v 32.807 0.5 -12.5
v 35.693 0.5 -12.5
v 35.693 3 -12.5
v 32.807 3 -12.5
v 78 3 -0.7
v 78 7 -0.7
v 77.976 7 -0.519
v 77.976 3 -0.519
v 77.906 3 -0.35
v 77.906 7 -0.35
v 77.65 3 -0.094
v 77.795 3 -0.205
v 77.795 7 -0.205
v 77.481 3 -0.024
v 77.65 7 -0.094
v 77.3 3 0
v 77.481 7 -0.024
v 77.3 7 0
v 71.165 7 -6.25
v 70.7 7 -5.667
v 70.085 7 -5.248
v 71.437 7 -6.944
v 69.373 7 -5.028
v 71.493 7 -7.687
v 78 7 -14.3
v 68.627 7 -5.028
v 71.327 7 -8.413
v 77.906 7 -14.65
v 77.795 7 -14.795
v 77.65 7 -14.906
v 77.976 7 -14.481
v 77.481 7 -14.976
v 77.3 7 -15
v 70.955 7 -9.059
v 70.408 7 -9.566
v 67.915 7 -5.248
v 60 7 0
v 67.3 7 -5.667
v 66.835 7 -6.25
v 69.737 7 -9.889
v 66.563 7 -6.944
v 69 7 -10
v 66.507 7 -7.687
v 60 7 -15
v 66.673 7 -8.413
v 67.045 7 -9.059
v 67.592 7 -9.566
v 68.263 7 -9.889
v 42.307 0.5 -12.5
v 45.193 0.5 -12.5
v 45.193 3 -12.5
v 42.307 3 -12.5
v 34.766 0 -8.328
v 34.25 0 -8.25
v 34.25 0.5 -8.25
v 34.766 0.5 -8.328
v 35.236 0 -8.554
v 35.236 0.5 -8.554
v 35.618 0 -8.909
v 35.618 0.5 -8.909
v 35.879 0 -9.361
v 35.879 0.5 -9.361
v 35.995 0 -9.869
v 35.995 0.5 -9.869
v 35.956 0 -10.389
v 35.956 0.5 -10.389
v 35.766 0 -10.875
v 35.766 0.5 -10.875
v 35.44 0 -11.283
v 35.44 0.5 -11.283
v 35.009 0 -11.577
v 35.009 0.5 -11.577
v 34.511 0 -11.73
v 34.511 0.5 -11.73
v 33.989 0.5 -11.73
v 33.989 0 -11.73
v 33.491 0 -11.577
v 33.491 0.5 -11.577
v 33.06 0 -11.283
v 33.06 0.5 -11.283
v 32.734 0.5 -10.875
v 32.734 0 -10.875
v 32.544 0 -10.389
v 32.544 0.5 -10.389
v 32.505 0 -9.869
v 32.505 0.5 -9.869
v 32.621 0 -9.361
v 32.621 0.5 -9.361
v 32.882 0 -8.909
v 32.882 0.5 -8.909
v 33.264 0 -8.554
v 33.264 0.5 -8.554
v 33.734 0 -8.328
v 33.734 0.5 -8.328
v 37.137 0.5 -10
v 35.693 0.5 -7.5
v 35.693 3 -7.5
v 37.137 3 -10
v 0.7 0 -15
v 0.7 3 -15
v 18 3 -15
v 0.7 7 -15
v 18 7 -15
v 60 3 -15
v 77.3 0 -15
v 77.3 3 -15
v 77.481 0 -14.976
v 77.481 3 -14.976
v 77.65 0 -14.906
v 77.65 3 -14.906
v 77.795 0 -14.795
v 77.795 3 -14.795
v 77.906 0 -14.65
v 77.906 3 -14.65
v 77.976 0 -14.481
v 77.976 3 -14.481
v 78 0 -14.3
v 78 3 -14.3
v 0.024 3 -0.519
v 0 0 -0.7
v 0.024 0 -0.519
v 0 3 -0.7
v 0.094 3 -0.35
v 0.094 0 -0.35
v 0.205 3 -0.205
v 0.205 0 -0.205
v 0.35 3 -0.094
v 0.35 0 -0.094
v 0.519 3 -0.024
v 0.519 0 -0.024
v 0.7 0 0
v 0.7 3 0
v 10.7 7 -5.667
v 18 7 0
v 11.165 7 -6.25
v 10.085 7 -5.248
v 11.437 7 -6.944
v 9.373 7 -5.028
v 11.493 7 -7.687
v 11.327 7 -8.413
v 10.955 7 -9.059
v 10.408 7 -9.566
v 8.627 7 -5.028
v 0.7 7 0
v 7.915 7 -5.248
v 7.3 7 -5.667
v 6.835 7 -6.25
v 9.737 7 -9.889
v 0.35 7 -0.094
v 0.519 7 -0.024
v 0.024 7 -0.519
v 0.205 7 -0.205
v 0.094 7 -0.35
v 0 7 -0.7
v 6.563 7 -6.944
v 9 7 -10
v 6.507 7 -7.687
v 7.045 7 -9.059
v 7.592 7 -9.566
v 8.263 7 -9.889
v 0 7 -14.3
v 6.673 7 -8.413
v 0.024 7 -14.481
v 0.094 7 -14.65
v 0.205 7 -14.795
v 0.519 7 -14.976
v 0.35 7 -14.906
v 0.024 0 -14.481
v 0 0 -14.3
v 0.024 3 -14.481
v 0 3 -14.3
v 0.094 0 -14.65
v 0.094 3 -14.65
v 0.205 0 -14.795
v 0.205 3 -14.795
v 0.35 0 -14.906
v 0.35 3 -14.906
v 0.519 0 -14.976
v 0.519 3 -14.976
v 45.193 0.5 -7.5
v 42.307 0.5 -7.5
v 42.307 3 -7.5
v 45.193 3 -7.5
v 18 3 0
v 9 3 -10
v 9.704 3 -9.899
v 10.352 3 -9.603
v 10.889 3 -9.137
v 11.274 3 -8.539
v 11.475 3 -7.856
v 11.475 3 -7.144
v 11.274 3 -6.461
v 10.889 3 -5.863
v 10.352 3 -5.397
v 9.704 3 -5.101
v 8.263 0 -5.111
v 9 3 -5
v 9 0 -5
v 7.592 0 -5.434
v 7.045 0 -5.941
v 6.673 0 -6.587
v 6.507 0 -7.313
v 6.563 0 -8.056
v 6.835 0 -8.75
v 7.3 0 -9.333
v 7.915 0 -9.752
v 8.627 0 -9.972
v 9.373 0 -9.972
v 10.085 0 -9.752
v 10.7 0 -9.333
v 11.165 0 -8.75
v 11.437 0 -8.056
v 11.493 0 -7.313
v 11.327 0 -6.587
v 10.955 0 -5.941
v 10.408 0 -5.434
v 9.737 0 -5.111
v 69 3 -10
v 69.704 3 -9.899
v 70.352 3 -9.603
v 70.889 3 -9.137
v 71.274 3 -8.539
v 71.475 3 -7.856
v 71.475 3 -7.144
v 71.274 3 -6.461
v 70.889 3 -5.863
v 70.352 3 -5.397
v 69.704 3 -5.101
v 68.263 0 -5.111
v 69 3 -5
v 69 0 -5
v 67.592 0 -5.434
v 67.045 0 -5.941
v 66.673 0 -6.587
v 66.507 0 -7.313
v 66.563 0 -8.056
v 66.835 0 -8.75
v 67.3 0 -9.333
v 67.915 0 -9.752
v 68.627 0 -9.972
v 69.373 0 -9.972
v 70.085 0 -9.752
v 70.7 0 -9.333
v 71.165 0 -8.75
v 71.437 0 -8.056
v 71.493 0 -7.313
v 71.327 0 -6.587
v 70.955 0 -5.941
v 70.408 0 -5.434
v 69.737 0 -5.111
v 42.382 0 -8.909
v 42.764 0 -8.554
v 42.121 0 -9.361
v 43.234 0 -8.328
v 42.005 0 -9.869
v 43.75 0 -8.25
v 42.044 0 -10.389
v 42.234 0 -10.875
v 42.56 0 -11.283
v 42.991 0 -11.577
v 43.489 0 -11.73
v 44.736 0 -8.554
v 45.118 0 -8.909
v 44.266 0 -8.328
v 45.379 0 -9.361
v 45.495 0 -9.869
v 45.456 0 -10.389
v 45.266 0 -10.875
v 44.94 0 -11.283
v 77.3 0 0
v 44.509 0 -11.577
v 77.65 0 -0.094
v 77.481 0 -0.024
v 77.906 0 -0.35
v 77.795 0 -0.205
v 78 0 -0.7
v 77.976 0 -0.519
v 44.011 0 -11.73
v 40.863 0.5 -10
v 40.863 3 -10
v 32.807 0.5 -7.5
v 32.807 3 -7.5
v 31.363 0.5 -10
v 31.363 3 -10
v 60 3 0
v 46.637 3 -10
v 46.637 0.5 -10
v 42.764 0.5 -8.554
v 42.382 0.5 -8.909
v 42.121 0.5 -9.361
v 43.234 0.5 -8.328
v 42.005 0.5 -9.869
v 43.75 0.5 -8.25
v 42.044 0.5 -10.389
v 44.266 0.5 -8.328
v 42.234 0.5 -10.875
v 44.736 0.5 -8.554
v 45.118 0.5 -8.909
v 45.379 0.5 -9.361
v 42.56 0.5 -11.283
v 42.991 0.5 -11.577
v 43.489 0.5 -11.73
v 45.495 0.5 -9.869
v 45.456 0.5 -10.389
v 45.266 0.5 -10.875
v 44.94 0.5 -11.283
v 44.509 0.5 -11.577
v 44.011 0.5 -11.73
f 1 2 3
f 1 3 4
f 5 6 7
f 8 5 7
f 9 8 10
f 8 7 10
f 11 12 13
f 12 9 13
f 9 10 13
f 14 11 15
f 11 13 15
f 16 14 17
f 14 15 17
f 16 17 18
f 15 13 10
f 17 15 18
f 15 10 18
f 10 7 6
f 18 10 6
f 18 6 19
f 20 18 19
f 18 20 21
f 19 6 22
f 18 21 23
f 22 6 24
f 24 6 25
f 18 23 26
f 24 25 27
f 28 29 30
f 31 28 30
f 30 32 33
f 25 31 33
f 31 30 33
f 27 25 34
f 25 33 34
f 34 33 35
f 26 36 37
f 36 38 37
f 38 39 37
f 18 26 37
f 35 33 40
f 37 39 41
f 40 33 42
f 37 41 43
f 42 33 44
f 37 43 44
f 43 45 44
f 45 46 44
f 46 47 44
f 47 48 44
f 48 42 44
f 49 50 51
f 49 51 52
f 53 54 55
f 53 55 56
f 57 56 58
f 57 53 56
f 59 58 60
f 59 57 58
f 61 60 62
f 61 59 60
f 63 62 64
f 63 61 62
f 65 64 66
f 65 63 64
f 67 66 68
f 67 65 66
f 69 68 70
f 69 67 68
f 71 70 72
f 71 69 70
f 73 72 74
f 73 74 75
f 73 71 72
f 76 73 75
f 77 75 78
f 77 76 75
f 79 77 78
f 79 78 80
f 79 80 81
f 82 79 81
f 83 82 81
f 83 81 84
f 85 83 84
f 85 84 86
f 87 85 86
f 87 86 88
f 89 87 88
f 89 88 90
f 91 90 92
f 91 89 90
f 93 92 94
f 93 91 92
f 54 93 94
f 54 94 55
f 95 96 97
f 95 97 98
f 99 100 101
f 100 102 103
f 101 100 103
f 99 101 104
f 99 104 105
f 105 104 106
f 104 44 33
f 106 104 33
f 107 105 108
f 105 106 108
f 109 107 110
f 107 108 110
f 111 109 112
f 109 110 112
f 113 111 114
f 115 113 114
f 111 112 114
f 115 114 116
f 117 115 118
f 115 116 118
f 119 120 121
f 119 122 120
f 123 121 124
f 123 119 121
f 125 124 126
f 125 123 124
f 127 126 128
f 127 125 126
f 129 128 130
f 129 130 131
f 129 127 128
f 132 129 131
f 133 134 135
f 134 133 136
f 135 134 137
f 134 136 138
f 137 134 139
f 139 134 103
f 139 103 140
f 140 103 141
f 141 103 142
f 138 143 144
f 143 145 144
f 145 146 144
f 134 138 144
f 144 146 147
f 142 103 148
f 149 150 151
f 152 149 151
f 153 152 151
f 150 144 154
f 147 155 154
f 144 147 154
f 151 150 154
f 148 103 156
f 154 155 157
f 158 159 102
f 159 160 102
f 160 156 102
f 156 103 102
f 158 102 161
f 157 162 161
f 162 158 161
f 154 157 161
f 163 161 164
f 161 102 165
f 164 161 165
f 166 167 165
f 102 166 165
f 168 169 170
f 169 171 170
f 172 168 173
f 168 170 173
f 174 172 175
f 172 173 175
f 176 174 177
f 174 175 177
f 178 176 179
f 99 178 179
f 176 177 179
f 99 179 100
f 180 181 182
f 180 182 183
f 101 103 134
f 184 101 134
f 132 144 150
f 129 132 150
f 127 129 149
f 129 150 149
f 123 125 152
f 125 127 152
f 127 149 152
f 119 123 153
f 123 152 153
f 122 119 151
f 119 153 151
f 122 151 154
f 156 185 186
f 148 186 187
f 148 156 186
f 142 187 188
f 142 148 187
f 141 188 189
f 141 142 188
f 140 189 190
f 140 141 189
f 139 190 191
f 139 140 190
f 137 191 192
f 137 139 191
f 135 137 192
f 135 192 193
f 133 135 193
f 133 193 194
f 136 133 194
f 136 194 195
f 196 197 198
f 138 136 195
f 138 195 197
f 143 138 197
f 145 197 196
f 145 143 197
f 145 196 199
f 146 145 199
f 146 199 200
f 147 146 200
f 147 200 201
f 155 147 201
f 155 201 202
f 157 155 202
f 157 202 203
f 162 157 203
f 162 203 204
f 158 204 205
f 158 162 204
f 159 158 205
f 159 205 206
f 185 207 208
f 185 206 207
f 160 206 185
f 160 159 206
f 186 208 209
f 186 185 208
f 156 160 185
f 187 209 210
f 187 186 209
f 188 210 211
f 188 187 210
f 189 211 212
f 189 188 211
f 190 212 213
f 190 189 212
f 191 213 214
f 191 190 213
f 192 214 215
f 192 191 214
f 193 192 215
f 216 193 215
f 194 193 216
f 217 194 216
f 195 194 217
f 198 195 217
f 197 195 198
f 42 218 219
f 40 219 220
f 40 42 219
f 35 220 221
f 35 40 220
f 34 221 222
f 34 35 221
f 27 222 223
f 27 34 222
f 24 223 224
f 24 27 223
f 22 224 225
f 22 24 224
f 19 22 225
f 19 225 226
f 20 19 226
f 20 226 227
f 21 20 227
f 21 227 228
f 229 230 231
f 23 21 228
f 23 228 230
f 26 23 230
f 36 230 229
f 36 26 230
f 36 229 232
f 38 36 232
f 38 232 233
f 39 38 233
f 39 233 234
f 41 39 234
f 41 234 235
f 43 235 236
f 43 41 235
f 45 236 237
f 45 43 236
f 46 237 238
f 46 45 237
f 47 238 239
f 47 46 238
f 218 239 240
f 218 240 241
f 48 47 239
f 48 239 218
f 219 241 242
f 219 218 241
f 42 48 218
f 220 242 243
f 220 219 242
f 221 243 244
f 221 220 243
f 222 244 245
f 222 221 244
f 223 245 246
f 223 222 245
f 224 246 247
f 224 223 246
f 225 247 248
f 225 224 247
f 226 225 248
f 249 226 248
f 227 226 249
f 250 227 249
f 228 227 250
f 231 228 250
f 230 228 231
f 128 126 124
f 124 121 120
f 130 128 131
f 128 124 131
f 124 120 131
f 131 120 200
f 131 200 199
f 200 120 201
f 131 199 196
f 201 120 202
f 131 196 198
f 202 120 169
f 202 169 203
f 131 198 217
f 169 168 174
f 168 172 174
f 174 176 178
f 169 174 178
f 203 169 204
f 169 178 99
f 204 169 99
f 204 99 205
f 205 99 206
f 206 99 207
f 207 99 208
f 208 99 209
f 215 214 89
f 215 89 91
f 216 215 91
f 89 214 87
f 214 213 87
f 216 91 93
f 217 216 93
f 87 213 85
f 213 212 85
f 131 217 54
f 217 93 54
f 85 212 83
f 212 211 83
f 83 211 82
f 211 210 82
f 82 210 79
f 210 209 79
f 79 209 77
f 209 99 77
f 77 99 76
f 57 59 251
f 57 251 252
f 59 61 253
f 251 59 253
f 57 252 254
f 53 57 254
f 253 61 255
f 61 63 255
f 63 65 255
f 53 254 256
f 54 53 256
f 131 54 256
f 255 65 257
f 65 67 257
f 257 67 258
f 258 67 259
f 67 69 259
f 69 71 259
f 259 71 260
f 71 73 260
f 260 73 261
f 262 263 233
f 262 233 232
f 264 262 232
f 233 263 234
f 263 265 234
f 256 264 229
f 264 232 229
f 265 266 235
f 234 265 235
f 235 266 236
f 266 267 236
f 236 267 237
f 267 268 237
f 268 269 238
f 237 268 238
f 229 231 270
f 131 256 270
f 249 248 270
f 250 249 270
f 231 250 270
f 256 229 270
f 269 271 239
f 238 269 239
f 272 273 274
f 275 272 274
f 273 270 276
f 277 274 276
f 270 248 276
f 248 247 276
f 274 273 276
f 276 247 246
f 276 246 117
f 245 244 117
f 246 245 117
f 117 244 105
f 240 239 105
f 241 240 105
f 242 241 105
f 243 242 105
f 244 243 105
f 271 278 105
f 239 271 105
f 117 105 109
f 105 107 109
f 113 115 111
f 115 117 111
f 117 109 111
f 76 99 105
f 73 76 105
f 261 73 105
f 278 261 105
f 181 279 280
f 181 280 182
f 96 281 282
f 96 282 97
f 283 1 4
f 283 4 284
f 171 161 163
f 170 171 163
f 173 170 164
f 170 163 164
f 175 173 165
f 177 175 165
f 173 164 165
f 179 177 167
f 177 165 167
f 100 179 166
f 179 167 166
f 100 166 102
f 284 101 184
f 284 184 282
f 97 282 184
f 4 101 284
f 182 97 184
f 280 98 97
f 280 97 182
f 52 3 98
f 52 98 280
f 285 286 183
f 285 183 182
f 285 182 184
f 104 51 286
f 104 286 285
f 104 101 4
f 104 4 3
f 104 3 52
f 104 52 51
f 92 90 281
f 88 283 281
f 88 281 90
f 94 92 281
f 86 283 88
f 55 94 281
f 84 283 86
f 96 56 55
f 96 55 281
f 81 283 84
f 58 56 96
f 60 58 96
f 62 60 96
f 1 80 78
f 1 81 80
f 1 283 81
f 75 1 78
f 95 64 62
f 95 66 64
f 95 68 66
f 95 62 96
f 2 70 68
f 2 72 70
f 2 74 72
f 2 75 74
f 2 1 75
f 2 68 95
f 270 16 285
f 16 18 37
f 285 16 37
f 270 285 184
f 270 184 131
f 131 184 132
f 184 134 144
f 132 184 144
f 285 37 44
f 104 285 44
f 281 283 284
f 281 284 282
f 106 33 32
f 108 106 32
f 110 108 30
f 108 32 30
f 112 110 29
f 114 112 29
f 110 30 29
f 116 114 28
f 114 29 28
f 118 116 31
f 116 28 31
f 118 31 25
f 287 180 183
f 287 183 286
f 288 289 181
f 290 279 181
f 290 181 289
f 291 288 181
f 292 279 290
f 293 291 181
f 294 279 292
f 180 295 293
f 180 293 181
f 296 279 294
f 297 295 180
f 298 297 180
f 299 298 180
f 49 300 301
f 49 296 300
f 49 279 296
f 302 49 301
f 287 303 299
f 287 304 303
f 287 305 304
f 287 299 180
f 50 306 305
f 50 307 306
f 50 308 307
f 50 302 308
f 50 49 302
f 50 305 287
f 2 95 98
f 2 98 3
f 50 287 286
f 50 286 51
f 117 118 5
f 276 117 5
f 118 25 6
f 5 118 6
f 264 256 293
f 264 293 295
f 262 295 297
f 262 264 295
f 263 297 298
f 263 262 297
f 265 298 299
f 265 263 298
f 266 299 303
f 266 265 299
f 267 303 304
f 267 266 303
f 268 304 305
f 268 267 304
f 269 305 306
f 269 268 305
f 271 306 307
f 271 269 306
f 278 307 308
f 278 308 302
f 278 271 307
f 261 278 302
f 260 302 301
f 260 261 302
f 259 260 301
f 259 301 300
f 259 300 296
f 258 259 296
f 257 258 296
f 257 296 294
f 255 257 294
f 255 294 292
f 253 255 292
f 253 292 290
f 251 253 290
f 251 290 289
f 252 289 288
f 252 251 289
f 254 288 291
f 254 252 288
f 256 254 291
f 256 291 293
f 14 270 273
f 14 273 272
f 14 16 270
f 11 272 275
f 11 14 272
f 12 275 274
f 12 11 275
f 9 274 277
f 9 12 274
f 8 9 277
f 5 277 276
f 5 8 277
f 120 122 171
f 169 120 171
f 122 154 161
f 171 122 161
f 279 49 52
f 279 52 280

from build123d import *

# Parameters (mm, degrees)
SKETCH1_W           = 78
SKETCH1_H           = 15
SKETCH1_R           = 2.5
BOSS_EXTRUDE1_DEPTH = 3
SKETCH1_3_R         = 1.75
BOSS_EXTRUDE2_DEPTH = 0.5
FILLET1_R           = 0.7
BOSS_EXTRUDE3_START = -7
SKETCH2_R           = 2.5
BOSS_EXTRUDE3_DEPTH = 7


with BuildPart() as part:
    # Sketch1 → Boss-Extrude1 (new body)
    with BuildSketch(Plane(origin=(0, 0, 0), x_dir=(1, 0, 0), z_dir=(0, 1, 0))):
        with Locations((39, 7.5)):
            Rectangle(SKETCH1_W, SKETCH1_H)
        with Locations((9, 7.5)):
            Circle(SKETCH1_R, mode=Mode.SUBTRACT)
        Polygon((31.363249, 10), (32.806624, 12.5), (35.693376, 12.5), (37.136751, 10), (35.693376, 7.5), (32.806624, 7.5), align=None, mode=Mode.SUBTRACT)
        Polygon((42.306624, 12.5), (45.193376, 12.5), (46.636751, 10), (45.193376, 7.5), (42.306624, 7.5), (40.863249, 10), align=None, mode=Mode.SUBTRACT)
        with Locations((69, 7.5)):
            Circle(SKETCH1_R, mode=Mode.SUBTRACT)
    extrude(amount=BOSS_EXTRUDE1_DEPTH)

    # Sketch1<3> → Boss-Extrude2 (add)
    # profile 1 of 2: a face of its own
    with BuildSketch(Plane(origin=(0, 0, 0), x_dir=(1, 0, 0), z_dir=(0, 1, 0))):
        Polygon((35.693376, 12.5), (32.806624, 12.5), (31.363249, 10), (32.806624, 7.5), (35.693376, 7.5), (37.136751, 10), align=None)
        with Locations((34.25, 10)):
            Circle(SKETCH1_3_R, mode=Mode.SUBTRACT)
    # profile 2 of 2: a face of its own
    with BuildSketch(Plane(origin=(0, 0, 0), x_dir=(1, 0, 0), z_dir=(0, 1, 0))):
        Polygon((46.636751, 10), (45.193376, 12.5), (42.306624, 12.5), (40.863249, 10), (42.306624, 7.5), (45.193376, 7.5), align=None)
        with Locations((43.75, 10)):
            Circle(SKETCH1_3_R, mode=Mode.SUBTRACT)
    extrude(amount=BOSS_EXTRUDE2_DEPTH)

    # Fillet1
    fillet1_edges = [part.edges().sort_by_distance(p)[0] for p in [
        (78, 1.5, -15),
        (78, 1.5, 0),
        (0, 1.5, 0),
        (0, 1.5, -15),
    ]]
    fillet(fillet1_edges, radius=FILLET1_R)

    # Sketch2 → Boss-Extrude3 (add)
    # profile 1 of 2: a face of its own
    with BuildSketch(Plane(origin=(0, 0, 0), x_dir=(-1, 0, 0), z_dir=(0, -1, 0)).offset(BOSS_EXTRUDE3_START)):
        with BuildLine():
            Line((-77.3, 0), (-60, 0))
            Line((-60, 0), (-60, 15))
            Line((-60, 15), (-77.3, 15))
            ThreePointArc((-77.3, 15), (-77.794975, 14.794975), (-78, 14.3))
            Line((-78, 14.3), (-78, 0.7))
            ThreePointArc((-78, 0.7), (-77.794975, 0.205025), (-77.3, 0))
        make_face()
        with Locations((-69, 7.5)):
            Circle(SKETCH2_R, mode=Mode.SUBTRACT)
    # profile 2 of 2: a face of its own
    with BuildSketch(Plane(origin=(0, 0, 0), x_dir=(-1, 0, 0), z_dir=(0, -1, 0)).offset(BOSS_EXTRUDE3_START)):
        with BuildLine():
            Line((-18, 15), (-18, 0))
            Line((-18, 0), (-0.7, 0))
            ThreePointArc((-0.7, 0), (-0.205025, 0.205025), (0, 0.7))
            Line((0, 0.7), (0, 14.3))
            ThreePointArc((0, 14.3), (-0.205025, 14.794975), (-0.7, 15))
            Line((-0.7, 15), (-18, 15))
        make_face()
        with Locations((-9, 7.5)):
            Circle(SKETCH2_R, mode=Mode.SUBTRACT)
    extrude(amount=BOSS_EXTRUDE3_DEPTH)


solid = part.part
